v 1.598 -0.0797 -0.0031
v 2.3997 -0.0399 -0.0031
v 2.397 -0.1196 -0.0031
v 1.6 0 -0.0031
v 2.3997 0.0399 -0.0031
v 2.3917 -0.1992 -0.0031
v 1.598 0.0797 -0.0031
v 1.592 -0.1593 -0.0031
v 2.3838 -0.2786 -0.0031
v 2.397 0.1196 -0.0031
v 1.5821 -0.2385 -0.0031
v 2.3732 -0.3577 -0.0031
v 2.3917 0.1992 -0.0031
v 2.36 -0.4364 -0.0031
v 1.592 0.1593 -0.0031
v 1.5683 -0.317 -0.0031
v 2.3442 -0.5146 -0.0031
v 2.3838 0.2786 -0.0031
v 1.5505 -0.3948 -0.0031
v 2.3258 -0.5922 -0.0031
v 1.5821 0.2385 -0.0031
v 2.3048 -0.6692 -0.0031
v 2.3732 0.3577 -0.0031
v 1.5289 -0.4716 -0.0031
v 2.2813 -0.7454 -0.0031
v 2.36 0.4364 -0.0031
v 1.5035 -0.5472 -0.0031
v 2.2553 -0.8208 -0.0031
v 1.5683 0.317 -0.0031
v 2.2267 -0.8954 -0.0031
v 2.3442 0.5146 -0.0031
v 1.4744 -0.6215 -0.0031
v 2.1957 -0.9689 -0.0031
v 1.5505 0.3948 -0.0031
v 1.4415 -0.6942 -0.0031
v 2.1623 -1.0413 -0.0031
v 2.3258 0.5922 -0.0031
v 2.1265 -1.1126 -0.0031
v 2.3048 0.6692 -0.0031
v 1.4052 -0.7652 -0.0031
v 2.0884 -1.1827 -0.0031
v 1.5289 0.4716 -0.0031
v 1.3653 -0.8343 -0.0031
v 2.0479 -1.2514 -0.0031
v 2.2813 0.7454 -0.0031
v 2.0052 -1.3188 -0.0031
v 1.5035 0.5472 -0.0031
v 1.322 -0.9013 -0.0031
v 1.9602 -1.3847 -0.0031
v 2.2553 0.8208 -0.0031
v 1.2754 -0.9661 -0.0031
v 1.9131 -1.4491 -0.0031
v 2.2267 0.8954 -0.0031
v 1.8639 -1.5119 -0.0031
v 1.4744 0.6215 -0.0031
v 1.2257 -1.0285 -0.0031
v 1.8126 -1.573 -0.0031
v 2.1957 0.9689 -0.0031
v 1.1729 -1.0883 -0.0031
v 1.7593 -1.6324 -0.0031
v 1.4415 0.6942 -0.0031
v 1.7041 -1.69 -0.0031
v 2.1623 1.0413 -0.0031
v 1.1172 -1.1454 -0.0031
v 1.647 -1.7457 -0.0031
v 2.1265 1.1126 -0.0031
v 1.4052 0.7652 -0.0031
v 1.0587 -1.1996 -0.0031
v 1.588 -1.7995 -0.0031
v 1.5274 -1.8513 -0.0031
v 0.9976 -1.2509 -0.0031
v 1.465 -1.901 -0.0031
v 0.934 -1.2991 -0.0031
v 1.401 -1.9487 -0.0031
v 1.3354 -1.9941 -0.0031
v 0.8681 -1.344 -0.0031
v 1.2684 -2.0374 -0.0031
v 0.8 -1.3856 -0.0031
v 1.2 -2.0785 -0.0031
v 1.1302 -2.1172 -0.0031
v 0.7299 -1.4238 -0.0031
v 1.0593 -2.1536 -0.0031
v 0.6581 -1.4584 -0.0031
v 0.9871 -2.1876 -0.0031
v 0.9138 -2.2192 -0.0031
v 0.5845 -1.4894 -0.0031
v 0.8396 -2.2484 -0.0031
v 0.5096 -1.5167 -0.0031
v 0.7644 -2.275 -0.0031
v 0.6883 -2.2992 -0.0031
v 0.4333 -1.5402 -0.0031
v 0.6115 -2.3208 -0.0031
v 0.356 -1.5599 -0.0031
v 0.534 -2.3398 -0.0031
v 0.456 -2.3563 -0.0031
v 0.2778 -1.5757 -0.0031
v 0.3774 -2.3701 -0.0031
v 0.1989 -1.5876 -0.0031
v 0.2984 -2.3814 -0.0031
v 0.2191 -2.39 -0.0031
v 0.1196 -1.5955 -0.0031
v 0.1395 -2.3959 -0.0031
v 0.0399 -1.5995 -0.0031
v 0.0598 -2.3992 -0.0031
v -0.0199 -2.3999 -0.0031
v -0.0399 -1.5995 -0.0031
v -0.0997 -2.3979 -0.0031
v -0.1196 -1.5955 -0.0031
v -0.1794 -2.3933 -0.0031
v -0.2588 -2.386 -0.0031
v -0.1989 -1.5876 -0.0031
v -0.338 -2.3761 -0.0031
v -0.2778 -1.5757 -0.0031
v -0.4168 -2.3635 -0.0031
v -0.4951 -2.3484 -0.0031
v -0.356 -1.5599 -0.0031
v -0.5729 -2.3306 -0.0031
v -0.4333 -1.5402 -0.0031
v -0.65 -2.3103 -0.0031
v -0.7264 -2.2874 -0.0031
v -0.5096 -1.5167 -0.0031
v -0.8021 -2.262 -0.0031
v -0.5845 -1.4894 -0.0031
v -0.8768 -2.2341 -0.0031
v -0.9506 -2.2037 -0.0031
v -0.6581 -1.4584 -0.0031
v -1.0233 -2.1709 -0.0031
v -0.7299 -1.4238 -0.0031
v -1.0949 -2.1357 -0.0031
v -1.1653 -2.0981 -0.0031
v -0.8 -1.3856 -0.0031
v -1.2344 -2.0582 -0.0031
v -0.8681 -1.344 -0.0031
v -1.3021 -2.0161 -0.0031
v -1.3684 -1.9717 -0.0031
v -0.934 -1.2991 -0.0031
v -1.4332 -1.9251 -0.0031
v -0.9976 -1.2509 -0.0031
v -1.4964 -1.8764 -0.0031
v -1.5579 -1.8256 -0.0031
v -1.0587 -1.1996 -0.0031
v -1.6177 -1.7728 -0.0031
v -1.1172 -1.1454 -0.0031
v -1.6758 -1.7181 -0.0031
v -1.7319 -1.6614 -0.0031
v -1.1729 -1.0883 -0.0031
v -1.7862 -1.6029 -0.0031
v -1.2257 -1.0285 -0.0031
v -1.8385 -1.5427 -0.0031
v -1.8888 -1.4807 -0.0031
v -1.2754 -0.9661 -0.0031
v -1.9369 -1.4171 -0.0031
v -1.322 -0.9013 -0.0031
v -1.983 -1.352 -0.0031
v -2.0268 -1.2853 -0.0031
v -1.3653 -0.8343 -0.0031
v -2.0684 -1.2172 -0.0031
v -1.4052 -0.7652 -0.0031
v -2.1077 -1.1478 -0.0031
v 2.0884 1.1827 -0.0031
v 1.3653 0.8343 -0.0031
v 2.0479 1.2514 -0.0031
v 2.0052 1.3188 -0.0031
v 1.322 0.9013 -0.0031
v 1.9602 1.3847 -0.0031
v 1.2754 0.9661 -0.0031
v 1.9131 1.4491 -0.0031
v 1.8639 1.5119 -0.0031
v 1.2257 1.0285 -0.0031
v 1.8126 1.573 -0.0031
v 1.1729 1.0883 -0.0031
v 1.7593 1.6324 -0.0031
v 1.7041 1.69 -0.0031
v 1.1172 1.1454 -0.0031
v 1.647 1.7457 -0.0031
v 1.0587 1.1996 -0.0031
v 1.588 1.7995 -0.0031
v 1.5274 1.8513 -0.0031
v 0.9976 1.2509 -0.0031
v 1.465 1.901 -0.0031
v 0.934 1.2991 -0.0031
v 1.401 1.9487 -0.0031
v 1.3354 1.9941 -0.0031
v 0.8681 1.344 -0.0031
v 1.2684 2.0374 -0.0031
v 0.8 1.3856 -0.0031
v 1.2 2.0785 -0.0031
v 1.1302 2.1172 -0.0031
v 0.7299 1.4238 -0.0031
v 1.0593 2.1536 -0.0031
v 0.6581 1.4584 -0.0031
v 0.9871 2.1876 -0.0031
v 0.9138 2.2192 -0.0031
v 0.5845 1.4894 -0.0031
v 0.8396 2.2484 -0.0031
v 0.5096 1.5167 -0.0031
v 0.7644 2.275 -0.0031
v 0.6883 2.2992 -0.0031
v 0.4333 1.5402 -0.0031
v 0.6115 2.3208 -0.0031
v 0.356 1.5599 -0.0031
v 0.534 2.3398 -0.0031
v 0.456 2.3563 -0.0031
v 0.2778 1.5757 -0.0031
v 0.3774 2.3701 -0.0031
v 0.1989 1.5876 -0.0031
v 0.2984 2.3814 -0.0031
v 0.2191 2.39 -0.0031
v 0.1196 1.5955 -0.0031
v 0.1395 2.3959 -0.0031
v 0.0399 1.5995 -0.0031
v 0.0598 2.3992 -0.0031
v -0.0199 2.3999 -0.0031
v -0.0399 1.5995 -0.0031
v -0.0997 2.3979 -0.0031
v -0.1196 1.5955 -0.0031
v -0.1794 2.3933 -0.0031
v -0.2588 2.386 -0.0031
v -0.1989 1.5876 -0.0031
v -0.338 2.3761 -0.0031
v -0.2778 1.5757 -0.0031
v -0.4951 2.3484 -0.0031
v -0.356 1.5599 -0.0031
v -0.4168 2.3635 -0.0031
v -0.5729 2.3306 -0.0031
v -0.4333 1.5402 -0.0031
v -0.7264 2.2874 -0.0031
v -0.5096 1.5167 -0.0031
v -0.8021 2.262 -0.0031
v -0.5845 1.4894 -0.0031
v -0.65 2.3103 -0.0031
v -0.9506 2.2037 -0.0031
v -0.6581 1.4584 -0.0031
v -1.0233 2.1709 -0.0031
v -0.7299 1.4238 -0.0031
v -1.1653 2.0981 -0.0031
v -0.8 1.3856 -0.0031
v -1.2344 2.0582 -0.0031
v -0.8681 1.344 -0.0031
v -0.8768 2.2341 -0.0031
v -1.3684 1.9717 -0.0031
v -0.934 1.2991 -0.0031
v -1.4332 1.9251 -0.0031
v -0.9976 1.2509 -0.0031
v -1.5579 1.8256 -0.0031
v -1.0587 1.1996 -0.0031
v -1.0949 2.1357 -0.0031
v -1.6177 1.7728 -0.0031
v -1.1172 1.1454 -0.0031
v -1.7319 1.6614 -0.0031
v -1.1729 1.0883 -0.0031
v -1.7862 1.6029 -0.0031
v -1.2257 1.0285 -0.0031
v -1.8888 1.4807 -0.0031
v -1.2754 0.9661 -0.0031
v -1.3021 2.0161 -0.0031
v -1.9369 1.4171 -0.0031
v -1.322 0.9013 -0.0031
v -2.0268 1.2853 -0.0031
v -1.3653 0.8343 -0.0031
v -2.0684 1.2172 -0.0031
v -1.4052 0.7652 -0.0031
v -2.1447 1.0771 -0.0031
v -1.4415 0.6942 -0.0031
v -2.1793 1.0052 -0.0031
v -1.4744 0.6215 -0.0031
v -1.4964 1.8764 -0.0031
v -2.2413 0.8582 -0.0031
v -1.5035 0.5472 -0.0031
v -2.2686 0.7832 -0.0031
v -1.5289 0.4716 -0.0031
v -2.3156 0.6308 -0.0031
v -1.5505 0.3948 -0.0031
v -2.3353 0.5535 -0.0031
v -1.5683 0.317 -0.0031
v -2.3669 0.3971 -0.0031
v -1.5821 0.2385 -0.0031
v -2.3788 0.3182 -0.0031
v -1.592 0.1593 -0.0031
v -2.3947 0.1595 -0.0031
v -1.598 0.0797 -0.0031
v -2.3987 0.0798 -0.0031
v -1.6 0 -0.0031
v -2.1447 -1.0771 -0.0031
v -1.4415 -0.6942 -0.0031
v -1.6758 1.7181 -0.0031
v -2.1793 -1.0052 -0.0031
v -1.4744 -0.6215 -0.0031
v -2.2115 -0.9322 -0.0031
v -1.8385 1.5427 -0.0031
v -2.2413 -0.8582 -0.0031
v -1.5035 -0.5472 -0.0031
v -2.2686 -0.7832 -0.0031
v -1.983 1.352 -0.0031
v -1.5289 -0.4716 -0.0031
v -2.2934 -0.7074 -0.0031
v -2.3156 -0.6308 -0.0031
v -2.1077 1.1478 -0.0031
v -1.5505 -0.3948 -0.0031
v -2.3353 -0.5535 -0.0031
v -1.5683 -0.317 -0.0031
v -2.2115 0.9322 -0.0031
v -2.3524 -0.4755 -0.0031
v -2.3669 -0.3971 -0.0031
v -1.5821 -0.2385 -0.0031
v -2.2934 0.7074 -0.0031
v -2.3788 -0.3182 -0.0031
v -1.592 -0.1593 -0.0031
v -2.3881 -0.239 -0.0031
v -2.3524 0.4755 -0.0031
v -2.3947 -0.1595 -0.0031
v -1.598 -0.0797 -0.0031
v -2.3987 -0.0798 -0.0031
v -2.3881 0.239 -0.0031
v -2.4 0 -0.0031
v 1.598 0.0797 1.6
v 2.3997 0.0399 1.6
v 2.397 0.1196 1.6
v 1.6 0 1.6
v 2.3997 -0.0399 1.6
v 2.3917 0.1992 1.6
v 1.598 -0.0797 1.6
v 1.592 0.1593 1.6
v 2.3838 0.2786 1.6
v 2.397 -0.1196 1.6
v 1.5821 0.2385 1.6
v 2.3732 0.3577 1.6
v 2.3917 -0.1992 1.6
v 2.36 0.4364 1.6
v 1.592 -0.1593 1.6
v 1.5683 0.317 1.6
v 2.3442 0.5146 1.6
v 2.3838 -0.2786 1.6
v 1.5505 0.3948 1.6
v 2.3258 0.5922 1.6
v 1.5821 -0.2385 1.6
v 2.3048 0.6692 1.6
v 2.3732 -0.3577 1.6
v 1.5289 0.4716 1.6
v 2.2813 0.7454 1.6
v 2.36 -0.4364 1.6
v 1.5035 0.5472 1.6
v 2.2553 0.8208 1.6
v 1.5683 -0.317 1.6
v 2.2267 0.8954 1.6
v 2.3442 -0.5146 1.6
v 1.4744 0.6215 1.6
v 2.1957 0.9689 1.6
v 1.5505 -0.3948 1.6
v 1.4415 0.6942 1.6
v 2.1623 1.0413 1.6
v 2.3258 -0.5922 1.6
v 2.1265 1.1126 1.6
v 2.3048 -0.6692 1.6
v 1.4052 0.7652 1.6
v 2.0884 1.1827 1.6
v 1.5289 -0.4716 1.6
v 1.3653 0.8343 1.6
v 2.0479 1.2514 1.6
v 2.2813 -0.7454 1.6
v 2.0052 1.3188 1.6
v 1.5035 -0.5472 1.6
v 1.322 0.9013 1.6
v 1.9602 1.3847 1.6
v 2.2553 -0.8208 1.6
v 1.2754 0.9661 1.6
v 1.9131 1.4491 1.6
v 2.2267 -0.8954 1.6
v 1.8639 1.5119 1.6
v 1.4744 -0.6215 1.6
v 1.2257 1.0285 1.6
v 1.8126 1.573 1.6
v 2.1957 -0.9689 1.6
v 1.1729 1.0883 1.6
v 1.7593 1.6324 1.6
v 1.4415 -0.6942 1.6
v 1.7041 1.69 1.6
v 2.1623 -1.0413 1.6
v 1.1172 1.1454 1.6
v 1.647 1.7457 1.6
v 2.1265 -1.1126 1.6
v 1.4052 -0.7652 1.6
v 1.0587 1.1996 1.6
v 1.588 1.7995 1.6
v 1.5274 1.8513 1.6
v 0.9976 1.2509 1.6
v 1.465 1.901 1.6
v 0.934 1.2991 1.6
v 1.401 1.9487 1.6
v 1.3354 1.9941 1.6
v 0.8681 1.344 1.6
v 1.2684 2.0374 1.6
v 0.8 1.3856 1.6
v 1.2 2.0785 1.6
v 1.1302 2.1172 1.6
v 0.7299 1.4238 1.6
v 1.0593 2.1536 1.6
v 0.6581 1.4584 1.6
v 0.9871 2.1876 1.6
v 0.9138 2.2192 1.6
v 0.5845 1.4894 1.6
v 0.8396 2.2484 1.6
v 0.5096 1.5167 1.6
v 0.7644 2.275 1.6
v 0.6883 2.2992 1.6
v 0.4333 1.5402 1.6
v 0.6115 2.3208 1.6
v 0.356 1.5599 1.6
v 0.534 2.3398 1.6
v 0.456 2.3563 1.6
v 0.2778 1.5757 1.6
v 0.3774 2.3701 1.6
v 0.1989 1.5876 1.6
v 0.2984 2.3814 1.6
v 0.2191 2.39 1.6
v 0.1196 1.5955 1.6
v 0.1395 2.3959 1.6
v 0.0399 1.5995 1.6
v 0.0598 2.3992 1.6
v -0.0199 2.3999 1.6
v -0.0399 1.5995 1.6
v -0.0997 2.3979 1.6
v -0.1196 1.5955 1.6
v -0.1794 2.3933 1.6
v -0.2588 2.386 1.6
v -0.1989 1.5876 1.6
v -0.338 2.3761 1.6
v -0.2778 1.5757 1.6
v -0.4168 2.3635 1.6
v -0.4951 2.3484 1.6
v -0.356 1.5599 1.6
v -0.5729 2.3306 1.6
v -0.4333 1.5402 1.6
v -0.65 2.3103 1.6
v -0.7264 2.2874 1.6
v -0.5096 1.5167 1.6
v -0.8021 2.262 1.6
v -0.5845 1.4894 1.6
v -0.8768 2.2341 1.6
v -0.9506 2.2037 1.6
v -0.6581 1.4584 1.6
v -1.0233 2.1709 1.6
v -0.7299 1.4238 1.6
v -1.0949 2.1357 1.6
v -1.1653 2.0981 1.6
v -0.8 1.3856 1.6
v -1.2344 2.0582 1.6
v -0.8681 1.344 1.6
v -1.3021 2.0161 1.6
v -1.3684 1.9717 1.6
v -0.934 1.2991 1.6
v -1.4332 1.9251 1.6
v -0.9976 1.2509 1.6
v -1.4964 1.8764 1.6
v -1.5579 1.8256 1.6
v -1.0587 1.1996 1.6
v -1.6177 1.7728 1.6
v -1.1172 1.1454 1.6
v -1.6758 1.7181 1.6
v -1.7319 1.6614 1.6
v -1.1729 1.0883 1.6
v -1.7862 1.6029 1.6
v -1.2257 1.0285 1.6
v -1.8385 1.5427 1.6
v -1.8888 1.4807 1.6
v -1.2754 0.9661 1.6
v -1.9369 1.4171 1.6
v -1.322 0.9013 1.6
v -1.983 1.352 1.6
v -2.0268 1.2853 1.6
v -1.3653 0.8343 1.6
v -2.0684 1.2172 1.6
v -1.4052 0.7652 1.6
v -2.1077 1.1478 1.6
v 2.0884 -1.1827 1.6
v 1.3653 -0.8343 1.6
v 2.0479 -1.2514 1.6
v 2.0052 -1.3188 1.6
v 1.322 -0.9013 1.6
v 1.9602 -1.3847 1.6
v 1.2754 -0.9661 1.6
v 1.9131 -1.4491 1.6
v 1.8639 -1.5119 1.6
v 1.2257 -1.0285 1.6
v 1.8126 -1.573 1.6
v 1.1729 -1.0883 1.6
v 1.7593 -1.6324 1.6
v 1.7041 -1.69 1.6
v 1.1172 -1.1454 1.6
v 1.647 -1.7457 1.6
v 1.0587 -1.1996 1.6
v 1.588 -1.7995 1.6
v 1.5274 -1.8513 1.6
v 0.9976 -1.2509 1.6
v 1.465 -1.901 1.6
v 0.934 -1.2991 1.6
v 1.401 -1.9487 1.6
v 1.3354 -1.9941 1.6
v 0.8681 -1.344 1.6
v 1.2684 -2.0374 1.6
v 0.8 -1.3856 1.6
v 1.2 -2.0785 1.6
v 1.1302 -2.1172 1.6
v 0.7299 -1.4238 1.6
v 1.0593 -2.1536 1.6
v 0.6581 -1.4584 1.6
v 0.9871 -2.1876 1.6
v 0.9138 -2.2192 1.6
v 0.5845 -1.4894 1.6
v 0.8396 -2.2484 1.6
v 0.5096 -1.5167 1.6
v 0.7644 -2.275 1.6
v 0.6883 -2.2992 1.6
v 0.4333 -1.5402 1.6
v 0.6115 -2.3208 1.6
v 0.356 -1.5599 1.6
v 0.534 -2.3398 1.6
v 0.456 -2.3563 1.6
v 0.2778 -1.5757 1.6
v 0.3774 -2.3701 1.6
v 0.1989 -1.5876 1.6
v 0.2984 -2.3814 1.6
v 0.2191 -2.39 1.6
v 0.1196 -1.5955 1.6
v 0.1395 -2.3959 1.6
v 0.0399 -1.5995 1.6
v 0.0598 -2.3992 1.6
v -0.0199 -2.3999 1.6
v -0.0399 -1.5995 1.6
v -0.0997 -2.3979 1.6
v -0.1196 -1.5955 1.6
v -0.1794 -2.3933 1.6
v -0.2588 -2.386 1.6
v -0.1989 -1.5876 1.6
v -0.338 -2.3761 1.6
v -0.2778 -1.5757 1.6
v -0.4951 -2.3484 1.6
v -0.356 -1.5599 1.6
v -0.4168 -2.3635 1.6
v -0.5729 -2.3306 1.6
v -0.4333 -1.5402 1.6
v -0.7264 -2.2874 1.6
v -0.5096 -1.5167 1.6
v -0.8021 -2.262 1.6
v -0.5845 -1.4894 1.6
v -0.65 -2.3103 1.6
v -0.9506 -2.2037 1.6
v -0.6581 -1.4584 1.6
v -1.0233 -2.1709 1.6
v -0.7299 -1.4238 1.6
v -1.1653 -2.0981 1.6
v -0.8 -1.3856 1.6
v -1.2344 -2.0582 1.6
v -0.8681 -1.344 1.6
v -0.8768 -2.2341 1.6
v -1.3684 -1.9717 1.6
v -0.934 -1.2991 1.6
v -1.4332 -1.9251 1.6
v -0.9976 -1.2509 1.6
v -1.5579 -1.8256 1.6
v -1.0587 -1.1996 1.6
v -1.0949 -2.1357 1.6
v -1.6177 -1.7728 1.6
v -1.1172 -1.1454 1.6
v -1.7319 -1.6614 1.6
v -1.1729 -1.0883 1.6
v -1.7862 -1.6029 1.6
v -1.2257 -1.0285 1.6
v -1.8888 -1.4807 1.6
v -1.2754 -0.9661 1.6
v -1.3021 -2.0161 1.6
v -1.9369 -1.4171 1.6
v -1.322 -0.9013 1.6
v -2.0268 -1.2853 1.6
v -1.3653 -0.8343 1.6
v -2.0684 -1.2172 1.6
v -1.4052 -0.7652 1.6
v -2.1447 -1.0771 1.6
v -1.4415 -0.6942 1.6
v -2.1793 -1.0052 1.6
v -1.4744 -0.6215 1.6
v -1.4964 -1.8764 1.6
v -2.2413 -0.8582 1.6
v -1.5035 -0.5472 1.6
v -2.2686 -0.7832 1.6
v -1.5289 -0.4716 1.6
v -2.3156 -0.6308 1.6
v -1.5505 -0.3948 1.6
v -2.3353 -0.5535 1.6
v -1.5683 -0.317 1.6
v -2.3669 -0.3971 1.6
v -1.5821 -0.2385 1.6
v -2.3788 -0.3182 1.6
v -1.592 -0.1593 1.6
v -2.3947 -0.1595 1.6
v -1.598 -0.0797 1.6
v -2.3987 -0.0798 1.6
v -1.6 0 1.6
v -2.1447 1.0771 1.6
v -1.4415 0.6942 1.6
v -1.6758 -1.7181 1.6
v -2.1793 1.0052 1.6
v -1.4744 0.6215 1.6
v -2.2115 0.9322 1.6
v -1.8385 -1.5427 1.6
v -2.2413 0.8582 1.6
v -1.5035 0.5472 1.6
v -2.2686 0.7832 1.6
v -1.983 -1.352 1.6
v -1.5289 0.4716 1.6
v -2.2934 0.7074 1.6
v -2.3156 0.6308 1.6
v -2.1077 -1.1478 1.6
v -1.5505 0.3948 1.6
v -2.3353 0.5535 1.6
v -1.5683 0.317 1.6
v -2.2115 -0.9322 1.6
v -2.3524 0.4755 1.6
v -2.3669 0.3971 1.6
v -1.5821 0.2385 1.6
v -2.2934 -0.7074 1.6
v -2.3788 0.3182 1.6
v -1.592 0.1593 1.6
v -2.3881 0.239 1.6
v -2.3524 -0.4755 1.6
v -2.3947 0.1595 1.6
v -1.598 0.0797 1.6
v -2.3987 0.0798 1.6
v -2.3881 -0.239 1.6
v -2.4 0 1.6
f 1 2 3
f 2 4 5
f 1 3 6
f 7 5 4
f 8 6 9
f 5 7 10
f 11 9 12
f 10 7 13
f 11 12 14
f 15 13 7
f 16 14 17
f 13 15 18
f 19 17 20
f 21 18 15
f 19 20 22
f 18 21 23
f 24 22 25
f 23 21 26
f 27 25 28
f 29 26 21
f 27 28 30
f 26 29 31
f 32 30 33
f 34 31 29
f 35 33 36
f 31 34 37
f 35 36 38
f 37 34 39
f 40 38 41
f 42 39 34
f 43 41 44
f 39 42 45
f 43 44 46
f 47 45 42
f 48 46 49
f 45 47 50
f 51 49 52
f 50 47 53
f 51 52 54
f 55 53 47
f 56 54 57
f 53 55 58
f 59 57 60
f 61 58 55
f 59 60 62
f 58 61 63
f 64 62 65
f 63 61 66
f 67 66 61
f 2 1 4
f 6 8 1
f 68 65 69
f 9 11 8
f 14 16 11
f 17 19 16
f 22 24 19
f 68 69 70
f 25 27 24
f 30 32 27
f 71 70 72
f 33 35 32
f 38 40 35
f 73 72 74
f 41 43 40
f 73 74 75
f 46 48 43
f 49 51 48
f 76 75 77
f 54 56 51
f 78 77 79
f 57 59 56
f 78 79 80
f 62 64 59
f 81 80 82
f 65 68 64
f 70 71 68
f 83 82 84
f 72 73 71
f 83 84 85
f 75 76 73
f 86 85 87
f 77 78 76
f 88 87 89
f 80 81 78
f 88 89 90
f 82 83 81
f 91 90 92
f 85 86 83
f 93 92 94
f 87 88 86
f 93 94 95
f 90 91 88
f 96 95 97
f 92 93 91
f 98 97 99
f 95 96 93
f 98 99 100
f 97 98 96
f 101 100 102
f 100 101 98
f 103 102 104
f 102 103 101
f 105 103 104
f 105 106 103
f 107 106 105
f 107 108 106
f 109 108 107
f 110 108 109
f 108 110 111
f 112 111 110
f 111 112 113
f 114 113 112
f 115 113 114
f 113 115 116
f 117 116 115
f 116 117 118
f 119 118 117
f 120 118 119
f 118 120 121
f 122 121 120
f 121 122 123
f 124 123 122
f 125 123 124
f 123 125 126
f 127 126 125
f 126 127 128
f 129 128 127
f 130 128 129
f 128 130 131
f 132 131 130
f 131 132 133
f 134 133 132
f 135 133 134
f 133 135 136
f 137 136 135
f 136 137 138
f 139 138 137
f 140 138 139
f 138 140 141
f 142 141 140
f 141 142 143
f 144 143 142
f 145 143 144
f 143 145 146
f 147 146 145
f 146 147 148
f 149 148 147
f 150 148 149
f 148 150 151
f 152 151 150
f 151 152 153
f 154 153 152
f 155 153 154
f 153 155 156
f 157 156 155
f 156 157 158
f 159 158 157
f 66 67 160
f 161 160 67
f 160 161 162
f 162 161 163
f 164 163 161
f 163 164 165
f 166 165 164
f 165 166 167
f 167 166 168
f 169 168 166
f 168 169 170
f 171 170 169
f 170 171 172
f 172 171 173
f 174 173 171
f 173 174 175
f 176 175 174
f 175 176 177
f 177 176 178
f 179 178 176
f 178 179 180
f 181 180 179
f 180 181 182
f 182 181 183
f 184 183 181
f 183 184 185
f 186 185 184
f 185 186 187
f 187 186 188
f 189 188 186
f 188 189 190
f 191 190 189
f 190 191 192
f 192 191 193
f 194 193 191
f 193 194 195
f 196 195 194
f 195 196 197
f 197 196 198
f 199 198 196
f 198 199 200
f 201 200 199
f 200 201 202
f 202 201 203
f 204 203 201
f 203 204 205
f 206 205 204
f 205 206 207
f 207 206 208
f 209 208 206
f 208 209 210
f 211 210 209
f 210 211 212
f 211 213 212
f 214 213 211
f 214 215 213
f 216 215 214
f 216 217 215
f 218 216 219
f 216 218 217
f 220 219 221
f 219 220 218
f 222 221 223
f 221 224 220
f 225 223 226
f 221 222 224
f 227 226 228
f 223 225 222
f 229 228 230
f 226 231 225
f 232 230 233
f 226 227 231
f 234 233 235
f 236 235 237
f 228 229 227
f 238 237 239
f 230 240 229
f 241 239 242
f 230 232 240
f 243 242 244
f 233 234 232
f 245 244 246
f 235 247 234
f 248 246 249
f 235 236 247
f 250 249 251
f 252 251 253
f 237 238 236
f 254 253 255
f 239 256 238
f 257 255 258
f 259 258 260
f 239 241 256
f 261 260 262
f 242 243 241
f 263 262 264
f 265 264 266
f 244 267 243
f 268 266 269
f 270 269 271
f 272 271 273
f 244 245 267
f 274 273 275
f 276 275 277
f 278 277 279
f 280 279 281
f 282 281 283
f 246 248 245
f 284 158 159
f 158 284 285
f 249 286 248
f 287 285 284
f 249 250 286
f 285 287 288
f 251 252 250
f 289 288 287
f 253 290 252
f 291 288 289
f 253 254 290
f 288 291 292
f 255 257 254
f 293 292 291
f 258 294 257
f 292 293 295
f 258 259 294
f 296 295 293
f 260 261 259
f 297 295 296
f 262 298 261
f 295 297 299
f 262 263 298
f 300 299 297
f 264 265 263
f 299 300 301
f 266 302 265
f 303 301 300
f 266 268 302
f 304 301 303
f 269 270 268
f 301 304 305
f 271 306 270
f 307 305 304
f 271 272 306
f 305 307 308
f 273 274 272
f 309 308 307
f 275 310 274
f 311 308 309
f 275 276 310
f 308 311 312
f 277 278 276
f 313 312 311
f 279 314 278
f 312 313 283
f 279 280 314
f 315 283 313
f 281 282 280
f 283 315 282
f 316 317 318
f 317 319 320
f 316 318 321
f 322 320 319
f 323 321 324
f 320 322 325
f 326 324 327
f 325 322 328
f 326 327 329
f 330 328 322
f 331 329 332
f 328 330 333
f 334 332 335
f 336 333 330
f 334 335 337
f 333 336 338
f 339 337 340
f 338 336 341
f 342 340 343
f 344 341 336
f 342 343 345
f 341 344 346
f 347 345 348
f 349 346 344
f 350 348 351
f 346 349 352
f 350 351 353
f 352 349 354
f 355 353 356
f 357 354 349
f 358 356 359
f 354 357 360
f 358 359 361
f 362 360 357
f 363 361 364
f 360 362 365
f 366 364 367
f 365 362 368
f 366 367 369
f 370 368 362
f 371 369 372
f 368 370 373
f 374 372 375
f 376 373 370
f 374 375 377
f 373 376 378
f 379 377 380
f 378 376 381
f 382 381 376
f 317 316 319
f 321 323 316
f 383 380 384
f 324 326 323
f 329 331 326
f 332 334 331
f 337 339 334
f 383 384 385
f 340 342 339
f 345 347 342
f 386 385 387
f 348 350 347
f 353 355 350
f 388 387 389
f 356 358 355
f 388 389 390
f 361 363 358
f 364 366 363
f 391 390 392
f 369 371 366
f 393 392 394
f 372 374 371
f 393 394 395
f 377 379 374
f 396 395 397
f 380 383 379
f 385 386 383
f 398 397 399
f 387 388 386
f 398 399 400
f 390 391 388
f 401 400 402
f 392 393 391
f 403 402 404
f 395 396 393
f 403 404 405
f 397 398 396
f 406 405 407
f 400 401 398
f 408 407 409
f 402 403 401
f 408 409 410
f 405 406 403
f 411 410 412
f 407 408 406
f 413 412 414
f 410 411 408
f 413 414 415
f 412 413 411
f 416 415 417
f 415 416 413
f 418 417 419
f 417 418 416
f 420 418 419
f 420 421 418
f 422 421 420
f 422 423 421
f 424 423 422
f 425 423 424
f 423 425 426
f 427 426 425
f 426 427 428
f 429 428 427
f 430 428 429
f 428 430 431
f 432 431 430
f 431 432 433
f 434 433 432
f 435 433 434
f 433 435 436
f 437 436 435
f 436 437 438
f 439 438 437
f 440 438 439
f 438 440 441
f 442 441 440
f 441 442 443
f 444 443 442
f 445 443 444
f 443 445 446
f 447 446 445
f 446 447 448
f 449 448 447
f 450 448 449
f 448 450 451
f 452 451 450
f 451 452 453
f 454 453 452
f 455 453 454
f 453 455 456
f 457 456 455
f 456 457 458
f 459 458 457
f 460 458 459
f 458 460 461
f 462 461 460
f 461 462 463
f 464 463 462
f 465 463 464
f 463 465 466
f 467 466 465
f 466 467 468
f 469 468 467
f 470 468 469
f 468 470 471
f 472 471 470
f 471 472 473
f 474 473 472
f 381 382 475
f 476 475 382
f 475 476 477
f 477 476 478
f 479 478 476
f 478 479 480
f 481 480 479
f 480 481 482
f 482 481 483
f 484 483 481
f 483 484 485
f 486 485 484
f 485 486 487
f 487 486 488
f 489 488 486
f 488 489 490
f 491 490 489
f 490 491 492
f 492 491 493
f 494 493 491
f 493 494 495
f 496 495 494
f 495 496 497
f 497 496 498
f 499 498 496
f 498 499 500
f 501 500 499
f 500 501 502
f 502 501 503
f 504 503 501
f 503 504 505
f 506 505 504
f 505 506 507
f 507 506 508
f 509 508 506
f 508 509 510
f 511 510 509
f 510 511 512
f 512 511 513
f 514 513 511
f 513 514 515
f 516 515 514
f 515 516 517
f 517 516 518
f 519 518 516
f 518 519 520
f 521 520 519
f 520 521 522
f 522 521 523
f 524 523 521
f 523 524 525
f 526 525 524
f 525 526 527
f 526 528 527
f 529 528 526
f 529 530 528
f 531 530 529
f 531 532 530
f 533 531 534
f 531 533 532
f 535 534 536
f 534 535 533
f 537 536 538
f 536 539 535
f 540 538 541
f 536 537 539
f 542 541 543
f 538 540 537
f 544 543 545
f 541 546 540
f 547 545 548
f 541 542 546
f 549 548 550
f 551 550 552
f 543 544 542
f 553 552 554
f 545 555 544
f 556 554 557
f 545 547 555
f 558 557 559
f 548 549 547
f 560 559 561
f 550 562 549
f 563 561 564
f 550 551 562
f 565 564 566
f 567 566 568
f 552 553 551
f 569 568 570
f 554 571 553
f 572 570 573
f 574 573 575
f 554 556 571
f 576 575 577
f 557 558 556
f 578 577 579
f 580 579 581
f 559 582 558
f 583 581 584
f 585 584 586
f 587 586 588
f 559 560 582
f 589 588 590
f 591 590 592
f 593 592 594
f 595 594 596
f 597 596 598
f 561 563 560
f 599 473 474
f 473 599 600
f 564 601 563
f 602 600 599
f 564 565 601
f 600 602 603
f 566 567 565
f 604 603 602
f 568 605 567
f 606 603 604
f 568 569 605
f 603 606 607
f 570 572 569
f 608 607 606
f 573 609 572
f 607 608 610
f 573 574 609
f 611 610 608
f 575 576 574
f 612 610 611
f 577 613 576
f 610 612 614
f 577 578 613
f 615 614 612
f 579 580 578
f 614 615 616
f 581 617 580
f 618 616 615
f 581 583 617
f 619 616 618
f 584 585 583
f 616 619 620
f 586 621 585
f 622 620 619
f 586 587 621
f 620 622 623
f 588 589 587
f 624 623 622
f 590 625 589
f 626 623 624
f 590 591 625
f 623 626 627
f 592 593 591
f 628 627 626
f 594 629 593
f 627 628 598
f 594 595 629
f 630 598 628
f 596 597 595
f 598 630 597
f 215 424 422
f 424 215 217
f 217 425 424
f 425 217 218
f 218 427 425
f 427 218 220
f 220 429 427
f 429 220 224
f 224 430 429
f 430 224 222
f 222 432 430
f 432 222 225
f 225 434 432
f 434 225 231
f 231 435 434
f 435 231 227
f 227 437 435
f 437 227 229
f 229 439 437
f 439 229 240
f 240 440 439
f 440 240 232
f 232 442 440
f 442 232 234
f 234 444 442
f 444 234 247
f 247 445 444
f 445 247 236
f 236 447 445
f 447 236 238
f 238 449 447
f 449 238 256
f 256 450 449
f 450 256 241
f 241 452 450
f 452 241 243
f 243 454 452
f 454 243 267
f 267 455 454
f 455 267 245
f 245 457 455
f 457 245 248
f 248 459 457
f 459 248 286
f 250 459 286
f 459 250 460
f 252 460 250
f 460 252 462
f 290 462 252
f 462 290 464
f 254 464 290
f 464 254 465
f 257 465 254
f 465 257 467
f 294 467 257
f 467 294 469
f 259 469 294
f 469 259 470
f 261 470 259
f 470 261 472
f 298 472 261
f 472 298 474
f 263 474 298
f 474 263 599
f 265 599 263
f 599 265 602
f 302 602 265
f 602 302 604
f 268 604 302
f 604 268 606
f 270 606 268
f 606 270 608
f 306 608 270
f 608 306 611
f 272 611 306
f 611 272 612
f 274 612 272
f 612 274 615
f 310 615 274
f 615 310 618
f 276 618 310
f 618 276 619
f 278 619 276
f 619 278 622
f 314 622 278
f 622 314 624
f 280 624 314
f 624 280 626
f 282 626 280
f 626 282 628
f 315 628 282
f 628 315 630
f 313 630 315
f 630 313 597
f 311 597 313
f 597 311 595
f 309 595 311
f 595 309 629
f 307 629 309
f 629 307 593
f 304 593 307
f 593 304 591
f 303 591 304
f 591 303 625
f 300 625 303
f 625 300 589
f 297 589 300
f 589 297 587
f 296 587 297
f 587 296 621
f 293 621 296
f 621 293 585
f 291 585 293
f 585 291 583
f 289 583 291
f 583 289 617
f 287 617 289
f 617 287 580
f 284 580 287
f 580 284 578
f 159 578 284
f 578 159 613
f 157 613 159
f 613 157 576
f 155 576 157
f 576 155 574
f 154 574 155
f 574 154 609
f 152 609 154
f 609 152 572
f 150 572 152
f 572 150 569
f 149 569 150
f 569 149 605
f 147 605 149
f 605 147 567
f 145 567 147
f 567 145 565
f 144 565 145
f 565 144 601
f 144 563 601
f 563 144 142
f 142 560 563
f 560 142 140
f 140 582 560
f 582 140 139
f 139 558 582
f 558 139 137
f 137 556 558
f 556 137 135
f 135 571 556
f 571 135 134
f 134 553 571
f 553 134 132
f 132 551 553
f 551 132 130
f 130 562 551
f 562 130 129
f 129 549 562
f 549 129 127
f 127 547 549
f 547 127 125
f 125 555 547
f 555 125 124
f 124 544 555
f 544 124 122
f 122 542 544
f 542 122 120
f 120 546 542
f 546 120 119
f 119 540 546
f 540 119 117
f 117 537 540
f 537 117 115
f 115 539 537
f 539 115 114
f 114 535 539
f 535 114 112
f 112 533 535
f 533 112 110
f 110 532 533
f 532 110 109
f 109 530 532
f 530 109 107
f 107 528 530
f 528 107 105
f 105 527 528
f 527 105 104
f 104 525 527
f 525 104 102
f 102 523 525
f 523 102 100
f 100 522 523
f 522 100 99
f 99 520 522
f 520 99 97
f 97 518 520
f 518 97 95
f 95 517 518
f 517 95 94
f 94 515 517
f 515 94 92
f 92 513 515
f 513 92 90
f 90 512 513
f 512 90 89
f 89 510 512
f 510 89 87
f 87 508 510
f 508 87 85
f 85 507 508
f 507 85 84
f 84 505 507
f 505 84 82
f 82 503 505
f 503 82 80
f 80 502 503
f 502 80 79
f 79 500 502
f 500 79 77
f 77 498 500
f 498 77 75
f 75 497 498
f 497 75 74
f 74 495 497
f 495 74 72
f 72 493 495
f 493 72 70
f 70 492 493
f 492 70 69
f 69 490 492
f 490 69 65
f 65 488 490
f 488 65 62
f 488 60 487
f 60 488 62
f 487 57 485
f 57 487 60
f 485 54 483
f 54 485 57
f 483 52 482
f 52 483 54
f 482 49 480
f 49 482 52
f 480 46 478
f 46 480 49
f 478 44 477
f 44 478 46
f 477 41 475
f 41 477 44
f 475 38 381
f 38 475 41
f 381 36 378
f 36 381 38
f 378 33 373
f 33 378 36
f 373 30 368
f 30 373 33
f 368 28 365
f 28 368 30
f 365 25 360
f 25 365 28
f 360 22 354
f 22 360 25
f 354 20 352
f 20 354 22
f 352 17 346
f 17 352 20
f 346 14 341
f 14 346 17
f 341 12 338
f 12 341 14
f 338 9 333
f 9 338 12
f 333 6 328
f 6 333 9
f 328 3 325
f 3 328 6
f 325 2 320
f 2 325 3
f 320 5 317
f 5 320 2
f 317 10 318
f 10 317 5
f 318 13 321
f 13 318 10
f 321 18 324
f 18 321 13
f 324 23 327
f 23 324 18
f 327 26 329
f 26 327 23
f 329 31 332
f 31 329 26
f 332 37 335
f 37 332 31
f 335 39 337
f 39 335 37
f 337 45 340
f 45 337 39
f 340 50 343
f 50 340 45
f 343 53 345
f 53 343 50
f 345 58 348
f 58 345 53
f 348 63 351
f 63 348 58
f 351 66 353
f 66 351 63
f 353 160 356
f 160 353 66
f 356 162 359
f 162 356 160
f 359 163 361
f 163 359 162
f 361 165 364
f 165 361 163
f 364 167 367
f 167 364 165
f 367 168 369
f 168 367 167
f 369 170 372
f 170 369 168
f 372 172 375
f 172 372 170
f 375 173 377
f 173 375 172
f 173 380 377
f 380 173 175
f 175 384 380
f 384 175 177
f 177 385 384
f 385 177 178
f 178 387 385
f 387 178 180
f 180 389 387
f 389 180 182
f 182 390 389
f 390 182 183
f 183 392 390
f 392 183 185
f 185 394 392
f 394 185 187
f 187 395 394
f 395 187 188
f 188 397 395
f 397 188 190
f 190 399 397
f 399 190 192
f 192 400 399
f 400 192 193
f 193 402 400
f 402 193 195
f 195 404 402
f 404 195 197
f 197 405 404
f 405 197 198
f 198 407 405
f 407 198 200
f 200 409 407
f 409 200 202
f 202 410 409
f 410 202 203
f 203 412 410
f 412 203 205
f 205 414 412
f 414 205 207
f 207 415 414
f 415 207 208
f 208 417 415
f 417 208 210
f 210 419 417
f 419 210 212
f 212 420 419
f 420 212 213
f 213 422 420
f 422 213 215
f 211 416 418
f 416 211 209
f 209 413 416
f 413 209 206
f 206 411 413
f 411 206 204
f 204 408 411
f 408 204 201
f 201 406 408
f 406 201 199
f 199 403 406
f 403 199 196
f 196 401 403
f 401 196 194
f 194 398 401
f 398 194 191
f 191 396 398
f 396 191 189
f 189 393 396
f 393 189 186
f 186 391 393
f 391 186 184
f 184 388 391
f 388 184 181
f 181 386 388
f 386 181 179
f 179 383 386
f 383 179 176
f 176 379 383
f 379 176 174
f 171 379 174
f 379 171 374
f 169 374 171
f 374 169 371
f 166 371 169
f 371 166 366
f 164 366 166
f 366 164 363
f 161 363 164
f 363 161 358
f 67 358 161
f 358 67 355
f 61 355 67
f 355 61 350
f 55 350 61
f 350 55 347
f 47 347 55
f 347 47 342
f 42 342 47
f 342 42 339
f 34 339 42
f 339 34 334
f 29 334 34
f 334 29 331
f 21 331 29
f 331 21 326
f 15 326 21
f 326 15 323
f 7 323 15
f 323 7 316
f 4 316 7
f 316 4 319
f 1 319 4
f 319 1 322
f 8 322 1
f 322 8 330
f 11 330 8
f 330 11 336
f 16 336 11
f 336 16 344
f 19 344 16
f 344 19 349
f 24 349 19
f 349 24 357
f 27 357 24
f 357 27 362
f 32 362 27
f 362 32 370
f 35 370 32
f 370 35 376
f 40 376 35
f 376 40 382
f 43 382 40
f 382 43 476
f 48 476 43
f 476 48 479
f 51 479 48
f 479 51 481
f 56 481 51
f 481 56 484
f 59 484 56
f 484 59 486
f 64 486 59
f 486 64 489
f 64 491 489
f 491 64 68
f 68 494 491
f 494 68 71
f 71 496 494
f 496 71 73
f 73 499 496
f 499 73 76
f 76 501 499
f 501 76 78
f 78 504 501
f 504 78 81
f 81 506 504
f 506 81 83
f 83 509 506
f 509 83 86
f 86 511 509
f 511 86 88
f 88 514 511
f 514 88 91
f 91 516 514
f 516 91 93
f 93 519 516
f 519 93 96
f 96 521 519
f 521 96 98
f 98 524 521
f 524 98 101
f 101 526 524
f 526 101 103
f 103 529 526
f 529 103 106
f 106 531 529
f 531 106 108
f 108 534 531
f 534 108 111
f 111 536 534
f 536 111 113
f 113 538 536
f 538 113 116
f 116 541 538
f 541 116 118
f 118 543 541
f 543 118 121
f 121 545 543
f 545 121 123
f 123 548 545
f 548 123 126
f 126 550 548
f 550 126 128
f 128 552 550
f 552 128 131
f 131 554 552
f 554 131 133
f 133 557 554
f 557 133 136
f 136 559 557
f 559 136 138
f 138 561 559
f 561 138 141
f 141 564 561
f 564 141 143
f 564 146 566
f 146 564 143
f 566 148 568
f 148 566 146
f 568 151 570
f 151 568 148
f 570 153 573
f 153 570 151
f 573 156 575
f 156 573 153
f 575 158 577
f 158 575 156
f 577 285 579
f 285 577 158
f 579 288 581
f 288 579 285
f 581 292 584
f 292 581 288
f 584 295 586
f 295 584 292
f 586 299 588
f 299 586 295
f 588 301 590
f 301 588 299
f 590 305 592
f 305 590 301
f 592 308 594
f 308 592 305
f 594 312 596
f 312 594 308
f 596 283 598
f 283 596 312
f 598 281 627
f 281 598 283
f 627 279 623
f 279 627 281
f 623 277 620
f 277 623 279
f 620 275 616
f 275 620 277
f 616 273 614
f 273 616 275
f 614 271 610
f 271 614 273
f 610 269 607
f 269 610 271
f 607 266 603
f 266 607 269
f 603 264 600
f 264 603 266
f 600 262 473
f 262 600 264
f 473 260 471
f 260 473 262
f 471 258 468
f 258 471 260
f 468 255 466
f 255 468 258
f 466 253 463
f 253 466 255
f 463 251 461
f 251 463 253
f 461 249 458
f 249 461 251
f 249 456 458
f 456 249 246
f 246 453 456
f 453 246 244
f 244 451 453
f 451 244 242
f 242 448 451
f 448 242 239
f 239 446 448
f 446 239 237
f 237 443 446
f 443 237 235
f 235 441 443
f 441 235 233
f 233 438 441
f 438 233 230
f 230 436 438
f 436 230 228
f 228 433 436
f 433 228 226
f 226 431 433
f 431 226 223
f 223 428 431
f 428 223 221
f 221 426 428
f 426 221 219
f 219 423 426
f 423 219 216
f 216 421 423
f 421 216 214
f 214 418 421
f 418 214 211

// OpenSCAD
use <../lib.scad>
use <../p/4-4disc.scad>
use <../p/axl5end.scad>
use <../p/axlehol2.scad>
use <../p/axlehol3.scad>
use <../p/axlehole.scad>
use <s/40001s01.scad>
use <s/40001s02.scad>
use <../p/stud2.scad>
$fa=1; $fs=0.2;
function ldraw_lib__18352(realsolid=false) = [
// 0 Technic Steering Wheel Yoke with Axle Hole and Hollow Stud
// 0 Name: 18352.dat
// 0 Author: Philippe Hurbain [Philo]
// 0 !LDRAW_ORG Part UPDATE 2022-02
// 0 !LICENSE Licensed under CC BY 2.0 and CC BY 4.0 : see CAreadme.txt
// 
// 0 BFC CERTIFY CCW
  [0,"BFC","CERTIFY"],
  [0,"BFC","CCW"],
// 
// 0 !HISTORY 2014-05-16 {LEGO Digital Designer} Original part shape
// 0 !HISTORY 2014-11-20 [Philo] File preparation for LDraw Parts Tracker
// 0 !HISTORY 2014-12-23 [PTadmin] Official Update 2014-02
// 0 !HISTORY 2021-12-30 [MagFors] Reshaped axlehole
// 0 !HISTORY 2022-03-06 [PTadmin] Official Update 2022-02
// 
// 
// 1 16 0 2 0 1 0 0 0 17 0 0 0 -1 axlehole.dat
  [1,16,0,2,0,1,0,0,0,17,0,0,0,-1, ldraw_lib__axlehole(realsolid)],
// 1 16 0 2 0 1 0 0 0 -1 0 0 0 -1 axl5end.dat
  [1,16,0,2,0,1,0,0,0,-1,0,0,0,-1, ldraw_lib__axl5end(realsolid)],
// 1 16 0 2 0 1 0 0 0 1 0 0 0 -1 axlehol2.dat
  [1,16,0,2,0,1,0,0,0,1,0,0,0,-1, ldraw_lib__axlehol2(realsolid)],
// 1 16 0 19 0 1 0 0 0 1 0 0 0 -1 axlehol3.dat
  [1,16,0,19,0,1,0,0,0,1,0,0,0,-1, ldraw_lib__axlehol3(realsolid)],
// 1 16 0 0 0 4 0 0 0 1 0 0 0 4 4-4disc.dat
  [1,16,0,0,0,4,0,0,0,1,0,0,0,4, ldraw_lib__4_4disc(realsolid)],
// 1 16 0 0 0 0 0 1 0 1 0 -1 0 0 stud2.dat
  [1,16,0,0,0,0,0,1,0,1,0,-1,0,0, ldraw_lib__stud2(realsolid)],
// 1 16 0 0 0 1 0 0 0 1 0 0 0 1 s\40001s02.dat
  [1,16,0,0,0,1,0,0,0,1,0,0,0,1, ldraw_lib__s__40001s02(realsolid)],
// 1 16 0 24 0 -1 0 0 0 1 0 0 0 -1 s\40001s01.dat
  [1,16,0,24,0,-1,0,0,0,1,0,0,0,-1, ldraw_lib__s__40001s01(realsolid)],
// 1 16 0 24 0 1 0 0 0 1 0 0 0 -1 s\40001s01.dat
  [1,16,0,24,0,1,0,0,0,1,0,0,0,-1, ldraw_lib__s__40001s01(realsolid)],
];
module ldraw_lib__18352(step=0, col=false, unit=2/5, alt=false, line=0.2, solid=!$preview)
    makepoly(ldraw_lib__18352(solid), step=step, col=col, unit=unit, alt=alt, line=line, solid=solid);
ldraw_lib__18352(line=0.2);
